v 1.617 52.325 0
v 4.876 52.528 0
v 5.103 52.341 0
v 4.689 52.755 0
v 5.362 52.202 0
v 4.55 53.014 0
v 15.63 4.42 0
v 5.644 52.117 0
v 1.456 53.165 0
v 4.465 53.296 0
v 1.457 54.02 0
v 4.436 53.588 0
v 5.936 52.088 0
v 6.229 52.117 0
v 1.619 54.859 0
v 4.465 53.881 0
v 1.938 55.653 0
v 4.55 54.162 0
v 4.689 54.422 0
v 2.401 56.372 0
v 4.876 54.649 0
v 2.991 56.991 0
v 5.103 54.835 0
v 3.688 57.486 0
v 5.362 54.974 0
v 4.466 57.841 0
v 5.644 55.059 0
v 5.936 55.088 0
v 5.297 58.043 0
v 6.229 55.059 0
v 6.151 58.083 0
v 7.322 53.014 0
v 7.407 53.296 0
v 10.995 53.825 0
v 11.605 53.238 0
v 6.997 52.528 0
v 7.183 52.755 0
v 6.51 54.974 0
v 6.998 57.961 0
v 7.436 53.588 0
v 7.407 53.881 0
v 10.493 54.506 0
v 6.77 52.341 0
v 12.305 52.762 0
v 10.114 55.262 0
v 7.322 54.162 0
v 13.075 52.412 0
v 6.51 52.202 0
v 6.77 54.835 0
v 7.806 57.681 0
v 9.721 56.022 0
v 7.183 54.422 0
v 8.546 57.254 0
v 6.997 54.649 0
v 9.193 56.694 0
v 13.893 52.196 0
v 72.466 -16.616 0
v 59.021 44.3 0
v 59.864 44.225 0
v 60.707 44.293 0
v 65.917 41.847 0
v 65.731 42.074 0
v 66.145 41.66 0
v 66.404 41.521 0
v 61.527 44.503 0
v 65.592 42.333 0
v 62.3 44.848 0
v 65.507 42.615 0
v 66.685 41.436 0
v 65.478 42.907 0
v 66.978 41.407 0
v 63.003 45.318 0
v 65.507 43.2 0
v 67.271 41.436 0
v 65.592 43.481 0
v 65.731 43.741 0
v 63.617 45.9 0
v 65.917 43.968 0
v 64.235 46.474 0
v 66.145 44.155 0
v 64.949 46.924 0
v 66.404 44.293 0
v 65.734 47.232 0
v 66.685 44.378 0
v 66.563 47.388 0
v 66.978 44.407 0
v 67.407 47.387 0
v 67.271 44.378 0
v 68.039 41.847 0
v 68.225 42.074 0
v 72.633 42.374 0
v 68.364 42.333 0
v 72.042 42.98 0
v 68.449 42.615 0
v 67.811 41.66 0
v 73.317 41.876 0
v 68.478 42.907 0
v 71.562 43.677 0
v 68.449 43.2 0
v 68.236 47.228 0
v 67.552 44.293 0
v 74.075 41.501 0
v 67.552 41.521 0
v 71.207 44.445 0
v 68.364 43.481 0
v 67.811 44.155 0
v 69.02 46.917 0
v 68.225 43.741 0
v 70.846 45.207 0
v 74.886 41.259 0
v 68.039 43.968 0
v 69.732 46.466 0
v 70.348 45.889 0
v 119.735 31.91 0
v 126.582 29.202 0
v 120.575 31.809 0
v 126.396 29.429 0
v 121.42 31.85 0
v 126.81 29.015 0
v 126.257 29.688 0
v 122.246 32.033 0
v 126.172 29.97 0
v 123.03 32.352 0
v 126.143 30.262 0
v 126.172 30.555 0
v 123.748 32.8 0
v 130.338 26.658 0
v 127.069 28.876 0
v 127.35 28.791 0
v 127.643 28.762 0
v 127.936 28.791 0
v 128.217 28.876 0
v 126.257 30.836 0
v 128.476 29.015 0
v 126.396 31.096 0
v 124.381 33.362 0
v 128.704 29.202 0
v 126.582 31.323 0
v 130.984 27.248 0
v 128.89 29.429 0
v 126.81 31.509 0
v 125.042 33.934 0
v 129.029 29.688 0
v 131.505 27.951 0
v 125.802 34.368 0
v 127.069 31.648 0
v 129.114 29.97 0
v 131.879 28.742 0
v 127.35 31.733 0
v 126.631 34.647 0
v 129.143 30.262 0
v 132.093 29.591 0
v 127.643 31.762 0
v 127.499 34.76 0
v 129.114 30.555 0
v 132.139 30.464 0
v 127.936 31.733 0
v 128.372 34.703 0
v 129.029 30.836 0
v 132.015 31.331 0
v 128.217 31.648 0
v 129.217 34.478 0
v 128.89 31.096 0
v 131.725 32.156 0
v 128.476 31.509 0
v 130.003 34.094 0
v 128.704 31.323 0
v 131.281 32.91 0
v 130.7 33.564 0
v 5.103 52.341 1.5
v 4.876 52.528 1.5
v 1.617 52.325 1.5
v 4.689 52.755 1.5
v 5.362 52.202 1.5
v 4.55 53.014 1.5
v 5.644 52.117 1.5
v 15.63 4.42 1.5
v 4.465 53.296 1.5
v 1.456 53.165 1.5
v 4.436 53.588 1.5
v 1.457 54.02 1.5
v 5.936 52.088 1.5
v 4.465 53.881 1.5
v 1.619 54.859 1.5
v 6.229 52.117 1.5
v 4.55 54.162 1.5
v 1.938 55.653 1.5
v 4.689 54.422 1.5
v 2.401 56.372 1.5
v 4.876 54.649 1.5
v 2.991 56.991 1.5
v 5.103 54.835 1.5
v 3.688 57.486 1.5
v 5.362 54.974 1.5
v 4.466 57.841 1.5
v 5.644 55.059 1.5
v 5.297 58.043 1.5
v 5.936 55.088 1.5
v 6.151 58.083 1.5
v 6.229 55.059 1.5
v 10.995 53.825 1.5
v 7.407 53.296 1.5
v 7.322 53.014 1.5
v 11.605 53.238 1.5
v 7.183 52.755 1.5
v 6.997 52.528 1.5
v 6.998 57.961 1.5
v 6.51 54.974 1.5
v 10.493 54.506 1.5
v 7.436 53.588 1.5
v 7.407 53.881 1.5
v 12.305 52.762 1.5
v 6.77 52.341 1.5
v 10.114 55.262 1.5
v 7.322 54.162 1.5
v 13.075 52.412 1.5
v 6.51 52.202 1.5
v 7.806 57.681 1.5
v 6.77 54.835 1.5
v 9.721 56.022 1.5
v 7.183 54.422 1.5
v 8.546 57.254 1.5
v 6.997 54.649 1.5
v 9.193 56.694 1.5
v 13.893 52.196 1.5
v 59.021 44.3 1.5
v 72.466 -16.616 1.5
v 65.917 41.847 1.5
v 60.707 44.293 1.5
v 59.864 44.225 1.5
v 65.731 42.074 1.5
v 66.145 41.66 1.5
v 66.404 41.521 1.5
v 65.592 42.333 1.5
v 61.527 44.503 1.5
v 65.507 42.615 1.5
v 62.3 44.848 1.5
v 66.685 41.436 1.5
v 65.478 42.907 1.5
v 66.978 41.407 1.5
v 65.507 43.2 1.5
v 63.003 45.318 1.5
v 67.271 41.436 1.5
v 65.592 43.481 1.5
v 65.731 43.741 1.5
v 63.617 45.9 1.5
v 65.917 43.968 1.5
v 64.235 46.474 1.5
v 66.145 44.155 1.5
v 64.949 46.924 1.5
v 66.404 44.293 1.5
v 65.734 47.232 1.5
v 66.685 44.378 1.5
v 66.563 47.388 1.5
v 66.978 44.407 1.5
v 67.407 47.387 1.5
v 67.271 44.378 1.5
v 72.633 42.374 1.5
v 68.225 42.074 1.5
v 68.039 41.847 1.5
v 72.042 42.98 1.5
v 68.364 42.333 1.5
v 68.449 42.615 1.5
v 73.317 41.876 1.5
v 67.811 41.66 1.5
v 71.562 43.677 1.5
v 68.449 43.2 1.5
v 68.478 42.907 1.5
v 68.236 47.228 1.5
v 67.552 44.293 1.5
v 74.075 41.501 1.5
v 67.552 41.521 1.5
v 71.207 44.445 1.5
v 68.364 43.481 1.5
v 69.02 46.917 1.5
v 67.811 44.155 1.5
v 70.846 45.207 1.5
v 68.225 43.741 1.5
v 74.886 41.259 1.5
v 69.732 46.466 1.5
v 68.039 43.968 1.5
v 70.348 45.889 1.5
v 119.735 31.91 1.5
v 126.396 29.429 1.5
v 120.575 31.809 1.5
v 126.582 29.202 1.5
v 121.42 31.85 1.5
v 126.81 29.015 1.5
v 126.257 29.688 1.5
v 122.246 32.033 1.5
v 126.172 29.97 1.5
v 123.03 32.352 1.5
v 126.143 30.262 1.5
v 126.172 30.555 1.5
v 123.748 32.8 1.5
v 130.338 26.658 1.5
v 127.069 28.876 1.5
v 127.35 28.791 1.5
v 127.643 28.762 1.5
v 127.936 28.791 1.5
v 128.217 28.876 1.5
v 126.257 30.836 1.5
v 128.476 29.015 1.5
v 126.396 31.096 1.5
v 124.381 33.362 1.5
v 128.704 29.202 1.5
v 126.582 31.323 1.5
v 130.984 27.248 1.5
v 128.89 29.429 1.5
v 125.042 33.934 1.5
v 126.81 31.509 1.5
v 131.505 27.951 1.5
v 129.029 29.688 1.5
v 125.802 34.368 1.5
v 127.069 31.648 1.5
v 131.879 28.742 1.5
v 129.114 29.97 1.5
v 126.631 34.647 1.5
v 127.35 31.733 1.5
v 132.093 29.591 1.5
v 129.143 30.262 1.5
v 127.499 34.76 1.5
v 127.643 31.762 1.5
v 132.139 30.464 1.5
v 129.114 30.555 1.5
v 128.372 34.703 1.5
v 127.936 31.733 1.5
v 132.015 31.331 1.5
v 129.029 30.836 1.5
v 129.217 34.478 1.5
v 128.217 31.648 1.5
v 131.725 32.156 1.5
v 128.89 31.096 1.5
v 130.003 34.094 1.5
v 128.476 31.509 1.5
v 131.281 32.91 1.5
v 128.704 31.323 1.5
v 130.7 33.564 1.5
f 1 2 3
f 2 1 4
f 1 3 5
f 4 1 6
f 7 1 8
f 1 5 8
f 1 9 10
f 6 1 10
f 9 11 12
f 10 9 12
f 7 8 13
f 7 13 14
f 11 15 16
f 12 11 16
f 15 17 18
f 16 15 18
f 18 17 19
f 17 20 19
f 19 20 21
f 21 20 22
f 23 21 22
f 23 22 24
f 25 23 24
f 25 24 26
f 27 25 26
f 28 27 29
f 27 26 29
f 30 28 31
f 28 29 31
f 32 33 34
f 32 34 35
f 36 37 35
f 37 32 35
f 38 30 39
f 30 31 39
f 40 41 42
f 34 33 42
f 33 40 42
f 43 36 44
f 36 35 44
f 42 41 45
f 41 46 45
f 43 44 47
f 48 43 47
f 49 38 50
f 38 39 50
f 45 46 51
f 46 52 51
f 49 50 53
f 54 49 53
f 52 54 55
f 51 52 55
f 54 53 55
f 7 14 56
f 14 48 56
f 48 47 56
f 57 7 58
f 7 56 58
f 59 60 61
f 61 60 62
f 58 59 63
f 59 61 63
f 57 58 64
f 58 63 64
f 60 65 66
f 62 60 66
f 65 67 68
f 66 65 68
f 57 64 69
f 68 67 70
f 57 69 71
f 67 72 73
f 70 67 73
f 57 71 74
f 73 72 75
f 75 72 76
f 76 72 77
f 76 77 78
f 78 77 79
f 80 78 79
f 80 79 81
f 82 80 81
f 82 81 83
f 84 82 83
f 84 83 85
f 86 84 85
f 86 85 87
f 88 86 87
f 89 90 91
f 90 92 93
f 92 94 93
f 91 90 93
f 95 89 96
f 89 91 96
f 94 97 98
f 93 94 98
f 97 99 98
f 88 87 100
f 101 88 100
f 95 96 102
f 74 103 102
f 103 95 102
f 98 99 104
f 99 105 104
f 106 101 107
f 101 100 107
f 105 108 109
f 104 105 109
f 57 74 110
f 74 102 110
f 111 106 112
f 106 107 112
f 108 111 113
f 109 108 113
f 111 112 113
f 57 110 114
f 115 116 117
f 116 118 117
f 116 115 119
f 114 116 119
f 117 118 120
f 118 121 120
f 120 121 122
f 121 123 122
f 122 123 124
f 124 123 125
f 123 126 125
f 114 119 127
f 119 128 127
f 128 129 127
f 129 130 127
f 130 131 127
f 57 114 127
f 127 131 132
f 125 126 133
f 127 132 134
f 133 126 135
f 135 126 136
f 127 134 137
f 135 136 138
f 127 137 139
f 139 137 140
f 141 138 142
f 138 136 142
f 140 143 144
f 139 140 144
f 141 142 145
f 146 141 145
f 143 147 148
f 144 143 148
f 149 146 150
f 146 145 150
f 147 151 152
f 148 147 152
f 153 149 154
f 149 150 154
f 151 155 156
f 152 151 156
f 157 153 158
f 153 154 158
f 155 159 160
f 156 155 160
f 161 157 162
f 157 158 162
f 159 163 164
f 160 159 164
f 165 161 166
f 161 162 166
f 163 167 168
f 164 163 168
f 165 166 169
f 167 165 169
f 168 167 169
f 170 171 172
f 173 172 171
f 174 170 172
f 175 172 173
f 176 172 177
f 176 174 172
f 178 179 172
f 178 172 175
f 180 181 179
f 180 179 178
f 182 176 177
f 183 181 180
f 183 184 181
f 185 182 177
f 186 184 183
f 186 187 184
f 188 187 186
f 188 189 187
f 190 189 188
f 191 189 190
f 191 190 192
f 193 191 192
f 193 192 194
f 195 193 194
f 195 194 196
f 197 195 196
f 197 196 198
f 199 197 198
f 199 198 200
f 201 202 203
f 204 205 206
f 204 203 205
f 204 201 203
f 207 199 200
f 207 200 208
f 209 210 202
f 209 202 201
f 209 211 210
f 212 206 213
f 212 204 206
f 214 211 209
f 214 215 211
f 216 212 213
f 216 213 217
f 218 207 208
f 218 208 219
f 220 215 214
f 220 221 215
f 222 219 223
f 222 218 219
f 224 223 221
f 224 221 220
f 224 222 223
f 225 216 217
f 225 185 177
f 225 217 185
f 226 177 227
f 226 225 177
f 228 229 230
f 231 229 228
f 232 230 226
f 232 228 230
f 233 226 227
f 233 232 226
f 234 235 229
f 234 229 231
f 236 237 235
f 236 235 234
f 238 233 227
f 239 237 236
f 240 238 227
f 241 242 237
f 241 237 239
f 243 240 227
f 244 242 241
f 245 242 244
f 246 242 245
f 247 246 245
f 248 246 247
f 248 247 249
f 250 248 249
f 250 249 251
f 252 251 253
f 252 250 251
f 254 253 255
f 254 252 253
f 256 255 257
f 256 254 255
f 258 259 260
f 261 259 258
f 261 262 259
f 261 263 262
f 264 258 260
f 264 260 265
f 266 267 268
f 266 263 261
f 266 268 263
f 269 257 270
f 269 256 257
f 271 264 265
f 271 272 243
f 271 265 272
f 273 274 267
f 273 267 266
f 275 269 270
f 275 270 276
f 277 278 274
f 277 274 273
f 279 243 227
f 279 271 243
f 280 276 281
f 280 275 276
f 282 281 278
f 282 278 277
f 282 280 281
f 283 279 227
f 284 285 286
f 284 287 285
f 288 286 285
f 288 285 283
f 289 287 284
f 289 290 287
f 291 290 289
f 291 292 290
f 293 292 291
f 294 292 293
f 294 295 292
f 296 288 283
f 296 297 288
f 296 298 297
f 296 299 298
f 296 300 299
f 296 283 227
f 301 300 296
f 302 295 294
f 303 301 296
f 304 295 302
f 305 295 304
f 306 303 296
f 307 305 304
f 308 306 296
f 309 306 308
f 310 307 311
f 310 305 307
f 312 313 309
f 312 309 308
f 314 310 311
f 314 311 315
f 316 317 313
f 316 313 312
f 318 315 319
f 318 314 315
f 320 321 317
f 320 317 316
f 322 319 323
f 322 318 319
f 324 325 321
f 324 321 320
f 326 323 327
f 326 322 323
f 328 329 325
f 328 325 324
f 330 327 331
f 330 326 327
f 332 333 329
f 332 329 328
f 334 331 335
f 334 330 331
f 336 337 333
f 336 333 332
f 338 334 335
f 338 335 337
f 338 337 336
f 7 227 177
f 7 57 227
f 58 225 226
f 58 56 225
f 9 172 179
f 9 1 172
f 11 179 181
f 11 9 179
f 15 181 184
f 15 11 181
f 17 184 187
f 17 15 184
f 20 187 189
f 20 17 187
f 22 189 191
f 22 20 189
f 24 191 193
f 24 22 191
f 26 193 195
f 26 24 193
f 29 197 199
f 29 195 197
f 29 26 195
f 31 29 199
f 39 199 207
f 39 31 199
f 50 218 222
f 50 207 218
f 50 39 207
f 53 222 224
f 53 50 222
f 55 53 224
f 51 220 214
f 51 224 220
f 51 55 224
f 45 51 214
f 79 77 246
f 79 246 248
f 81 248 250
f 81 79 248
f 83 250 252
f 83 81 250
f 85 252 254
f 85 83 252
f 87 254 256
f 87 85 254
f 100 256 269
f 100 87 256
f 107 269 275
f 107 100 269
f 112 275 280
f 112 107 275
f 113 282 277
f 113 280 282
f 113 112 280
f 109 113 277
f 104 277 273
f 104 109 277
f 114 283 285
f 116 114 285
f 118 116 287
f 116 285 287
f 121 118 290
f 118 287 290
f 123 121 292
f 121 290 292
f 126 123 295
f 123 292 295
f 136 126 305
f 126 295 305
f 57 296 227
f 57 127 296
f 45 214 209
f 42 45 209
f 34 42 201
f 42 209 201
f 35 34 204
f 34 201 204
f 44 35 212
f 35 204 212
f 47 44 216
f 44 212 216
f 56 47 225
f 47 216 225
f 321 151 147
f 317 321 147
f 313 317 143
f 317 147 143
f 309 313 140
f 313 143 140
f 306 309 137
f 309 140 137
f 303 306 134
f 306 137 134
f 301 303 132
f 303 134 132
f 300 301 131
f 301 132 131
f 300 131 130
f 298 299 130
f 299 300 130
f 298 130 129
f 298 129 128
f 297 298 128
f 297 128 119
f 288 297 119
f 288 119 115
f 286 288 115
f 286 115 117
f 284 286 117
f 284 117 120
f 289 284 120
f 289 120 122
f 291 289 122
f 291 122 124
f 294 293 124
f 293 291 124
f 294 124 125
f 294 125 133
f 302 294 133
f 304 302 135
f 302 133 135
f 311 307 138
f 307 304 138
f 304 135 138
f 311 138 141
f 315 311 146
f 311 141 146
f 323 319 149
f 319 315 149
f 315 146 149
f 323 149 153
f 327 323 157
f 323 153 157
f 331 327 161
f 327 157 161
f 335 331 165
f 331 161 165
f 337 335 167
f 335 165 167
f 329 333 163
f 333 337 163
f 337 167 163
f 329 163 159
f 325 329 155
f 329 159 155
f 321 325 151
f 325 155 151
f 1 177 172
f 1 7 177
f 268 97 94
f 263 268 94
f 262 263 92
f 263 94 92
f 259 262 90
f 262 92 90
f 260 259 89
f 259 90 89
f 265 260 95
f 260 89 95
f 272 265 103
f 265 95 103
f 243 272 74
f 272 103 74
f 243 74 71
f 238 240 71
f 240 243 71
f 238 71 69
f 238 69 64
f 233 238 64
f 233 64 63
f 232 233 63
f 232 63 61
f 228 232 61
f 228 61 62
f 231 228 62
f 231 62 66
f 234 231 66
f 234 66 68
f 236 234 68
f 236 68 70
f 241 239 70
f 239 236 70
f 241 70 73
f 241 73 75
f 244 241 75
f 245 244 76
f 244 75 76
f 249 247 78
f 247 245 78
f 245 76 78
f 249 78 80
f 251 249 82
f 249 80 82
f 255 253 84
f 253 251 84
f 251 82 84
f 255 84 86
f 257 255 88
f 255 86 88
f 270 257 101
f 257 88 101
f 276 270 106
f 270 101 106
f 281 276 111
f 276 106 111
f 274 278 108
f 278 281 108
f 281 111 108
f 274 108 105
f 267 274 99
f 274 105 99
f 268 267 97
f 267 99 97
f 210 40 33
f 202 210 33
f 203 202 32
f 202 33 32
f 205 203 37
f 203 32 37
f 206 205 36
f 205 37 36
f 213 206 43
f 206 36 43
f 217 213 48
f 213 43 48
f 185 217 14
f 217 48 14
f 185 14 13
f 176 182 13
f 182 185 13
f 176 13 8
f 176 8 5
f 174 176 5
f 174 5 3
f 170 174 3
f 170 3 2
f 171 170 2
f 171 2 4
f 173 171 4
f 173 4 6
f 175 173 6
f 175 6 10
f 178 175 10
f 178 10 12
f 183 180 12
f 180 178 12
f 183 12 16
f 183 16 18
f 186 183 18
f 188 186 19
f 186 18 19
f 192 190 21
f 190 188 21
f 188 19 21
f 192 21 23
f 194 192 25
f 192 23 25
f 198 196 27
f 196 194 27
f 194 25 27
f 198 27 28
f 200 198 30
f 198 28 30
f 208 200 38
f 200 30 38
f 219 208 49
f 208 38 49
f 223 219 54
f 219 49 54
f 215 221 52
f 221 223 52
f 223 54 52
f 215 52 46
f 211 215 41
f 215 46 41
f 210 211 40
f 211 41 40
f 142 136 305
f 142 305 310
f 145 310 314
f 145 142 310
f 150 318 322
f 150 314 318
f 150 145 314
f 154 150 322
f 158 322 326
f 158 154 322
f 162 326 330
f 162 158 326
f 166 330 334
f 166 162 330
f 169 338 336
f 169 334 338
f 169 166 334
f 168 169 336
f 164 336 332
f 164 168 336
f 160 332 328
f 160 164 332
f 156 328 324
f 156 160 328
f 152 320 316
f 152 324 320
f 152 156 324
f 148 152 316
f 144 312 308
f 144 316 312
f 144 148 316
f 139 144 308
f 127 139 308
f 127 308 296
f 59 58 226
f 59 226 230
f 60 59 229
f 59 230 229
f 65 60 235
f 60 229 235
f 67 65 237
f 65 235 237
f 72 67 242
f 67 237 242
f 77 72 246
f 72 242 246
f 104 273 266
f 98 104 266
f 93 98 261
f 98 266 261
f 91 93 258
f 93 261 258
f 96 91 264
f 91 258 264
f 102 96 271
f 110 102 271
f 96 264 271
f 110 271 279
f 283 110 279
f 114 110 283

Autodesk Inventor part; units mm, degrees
ref_plane "YZ Plane" through (0, 0, 0) normal (1, 0, 0) x (0, 1, 0)
ref_plane "XZ Plane" through (0, 0, 0) normal (0, 1, 0) x (-1, 0, 0)
ref_plane "XY Plane" through (0, 0, 0) normal (0, 0, 1) x (1, 0, 0)
sketch "スケッチ1" plane through (0, 0, 0) normal (0, 0, 1) x (1, 0, 0)
  circle A0 centre (-35.9404, 22.842) radius 1.5
  circle A1 centre (5.9362, 53.5882) radius 1.5
  circle A2 centre (127.6431, 30.2622) radius 1.5
  line L0 (22.9895, 50.3198) -> (110.5899, 33.5306)
  circle A3 centre (5.9362, 53.5882) radius 4.5
  circle A4 centre (127.6431, 30.2622) radius 4.5
  circle A5 centre (-35.9404, 22.842) radius 3
  line L1 (5.0892, 49.1686) -> (9.9998, 48.2275)
  line L2 (9.9998, 48.2275) -> (22.9895, 50.3198)
  line L3 (110.5899, 33.5306) -> (121.8855, 26.7838)
  line L4 (121.8855, 26.7838) -> (126.7961, 25.8426)
  line L5 (4.4419, 57.8328) -> (15.2047, 61.622)
  line L6 (-37.785, 25.2079) -> (3.1694, 57.1371)
  line L7 (3.5126, 49.7966) -> (-34.0959, 20.4761)
  line L8 (122.0018, 41.1536) -> (130.601, 33.6535)
  circle A6 centre (80.3181, 36.2778) radius 3
  circle A7 centre (80.3181, 36.2778) radius 4.5
  line L9 (128.2106, 34.7263) -> (80.8855, 40.7419)
  circle A8 centre (80.4743, 23.124) radius 1.5
  line L10 (120.4636, 35.711) -> (121.0283, 38.6574)
  line L11 (15.1864, 58.9428) -> (14.6217, 55.9964)
  circle A9 centre (66.9779, 42.9073) radius 1.5
  circle A10 centre (66.9779, 42.9073) radius 3
  line L12 (29.9182, 56.1193) -> (29.3535, 53.1729)
  arc A11 (17.2488, 58.5475) -> (15.1864, 58.9428) centre (16.2176, 58.7451) ccw
  arc A12 (29.9182, 56.1193) -> (27.8558, 56.5146) centre (28.887, 56.3169) ccw
  arc A13 (27.2911, 53.5682) -> (29.3535, 53.1729) centre (28.3223, 53.3705) ccw
  arc A14 (14.6217, 55.9964) -> (16.6841, 55.6011) centre (15.6529, 55.7987) ccw
  line L13 (17.2488, 58.5475) -> (27.8558, 56.5146)
  line L14 (16.6841, 55.6011) -> (27.2911, 53.5682)
  arc A15 (31.8825, 55.7428) -> (27.0019, 58.7146) centre (28.887, 56.3169) ccw
  line L15 (27.0019, 58.7146) -> (18.8556, 60.2759)
  arc A16 (18.8556, 60.2759) -> (15.2047, 61.622) centre (16.2176, 58.7451) ccw
  line L16 (106.2964, 41.4808) -> (105.7317, 38.5345)
  arc A17 (108.3589, 41.0856) -> (106.2964, 41.4808) centre (107.3276, 41.2832) ccw
  arc A18 (121.0283, 38.6574) -> (118.9658, 39.0527) centre (119.997, 38.855) ccw
  arc A19 (118.4011, 36.1063) -> (120.4636, 35.711) centre (119.4323, 35.9086) ccw
  arc A20 (105.7317, 38.5345) -> (107.7942, 38.1392) centre (106.7629, 38.3368) ccw
  line L17 (31.8825, 55.7428) -> (104.3322, 41.8573)
  line L18 (108.3589, 41.0856) -> (118.9658, 39.0527)
  line L19 (107.7942, 38.1392) -> (118.4011, 36.1063)
  arc A21 (122.0018, 41.1536) -> (118.1119, 41.2527) centre (119.997, 38.855) ccw
  line L20 (118.1119, 41.2527) -> (109.9656, 42.814)
  arc A22 (109.9656, 42.814) -> (104.3322, 41.8573) centre (107.3276, 41.2832) ccw
  line L21 (30.451, 58.9354) -> (37.6452, 54.6383)
  line L22 (16.7917, 61.7406) -> (29.4611, 59.3124)
  line L23 (120.5711, 41.8505) -> (107.9017, 44.2787)
  line L24 (106.8426, 44.2944) -> (98.5694, 42.9618)
  point P0 (0, 0)
  point P1 (0, 0)
  dimension "d4" = 9
  dimension "d0" = 9
  dimension "d1" = 9
  dimension "d2" = 6
  dimension "d3" = 6
  dimension "d5" = 47.7059
  dimension "d6" = 47.7059
  dimension "d7" = 3
  dimension "d8" = 3
  dimension "d9" = 8.0769
  dimension "d10" = 8.0769
  dimension "d11" = 3
  dimension "d12" = 6
  dimension "d13" = 61.9691
  dimension "d14" = 61.9691
  dimension "d15" = 15
  dimension "d16" = 2.1
  dimension "d17" = 2
  dimension "d18" = 2
  dimension "d19" = 2
  dimension "d20" = 15
  dimension "d21" = 2.1
  dimension "d22" = 7
  dimension "d23" = 2
  dimension "d24" = 2
  dimension "d25" = 5
  dimension "d26" = 5
  dimension "d27" = 160
  dimension "d28" = 160
  dimension "d29" = 160
  dimension "d30" = 160
sketch "スケッチ2" plane through (0, 0, 0) normal (0, 0, 1) x (1, 0, 0)
  circle A0 centre (5.9362, 53.5882) radius 1.5 projected
  circle A1 centre (66.9779, 42.9073) radius 1.5 projected
  circle A2 centre (127.6431, 30.2622) radius 1.5 projected
  arc A3 (10.3689, 52.8126) -> (1.6172, 52.3248) centre (5.9362, 53.5882) ccw
  arc A4 (71.3832, 41.9891) -> (62.5453, 43.6829) centre (66.9779, 42.9073) ccw
  arc A5 (130.338, 26.6583) -> (123.2378, 31.1804) centre (127.6431, 30.2622) ccw
  line L0 (10.3689, 52.8126) -> (62.5453, 43.6829)
  line L1 (71.3832, 41.9891) -> (123.2378, 31.1804)
  line L2 (130.338, 26.6583) -> (72.4655, -16.6159)
  line L3 (72.4655, -16.6159) -> (15.6298, 4.4202)
  line L4 (15.6298, 4.4202) -> (1.6172, 52.3248)
  point P0 (0, 0)
  dimension "d31" = 9
  dimension "d32" = 9
  dimension "d33" = 9
extrude "押し出し1" add sketch "スケッチ2" along normal blind 1.5
fillet "フィレット1" radius 5 4 edges at (10.3689, 52.8126, 0.75) (62.5453, 43.6829, 0.75) (71.3832, 41.9891, 0.75) (123.2378, 31.1804, 0.75)
equation "\"d6\" = d5"
equation "\"d10\" = d9"
equation "\"d14\" = d13"
properties part number "台形サスカバー" material "ポリカーボネート、クリア"
